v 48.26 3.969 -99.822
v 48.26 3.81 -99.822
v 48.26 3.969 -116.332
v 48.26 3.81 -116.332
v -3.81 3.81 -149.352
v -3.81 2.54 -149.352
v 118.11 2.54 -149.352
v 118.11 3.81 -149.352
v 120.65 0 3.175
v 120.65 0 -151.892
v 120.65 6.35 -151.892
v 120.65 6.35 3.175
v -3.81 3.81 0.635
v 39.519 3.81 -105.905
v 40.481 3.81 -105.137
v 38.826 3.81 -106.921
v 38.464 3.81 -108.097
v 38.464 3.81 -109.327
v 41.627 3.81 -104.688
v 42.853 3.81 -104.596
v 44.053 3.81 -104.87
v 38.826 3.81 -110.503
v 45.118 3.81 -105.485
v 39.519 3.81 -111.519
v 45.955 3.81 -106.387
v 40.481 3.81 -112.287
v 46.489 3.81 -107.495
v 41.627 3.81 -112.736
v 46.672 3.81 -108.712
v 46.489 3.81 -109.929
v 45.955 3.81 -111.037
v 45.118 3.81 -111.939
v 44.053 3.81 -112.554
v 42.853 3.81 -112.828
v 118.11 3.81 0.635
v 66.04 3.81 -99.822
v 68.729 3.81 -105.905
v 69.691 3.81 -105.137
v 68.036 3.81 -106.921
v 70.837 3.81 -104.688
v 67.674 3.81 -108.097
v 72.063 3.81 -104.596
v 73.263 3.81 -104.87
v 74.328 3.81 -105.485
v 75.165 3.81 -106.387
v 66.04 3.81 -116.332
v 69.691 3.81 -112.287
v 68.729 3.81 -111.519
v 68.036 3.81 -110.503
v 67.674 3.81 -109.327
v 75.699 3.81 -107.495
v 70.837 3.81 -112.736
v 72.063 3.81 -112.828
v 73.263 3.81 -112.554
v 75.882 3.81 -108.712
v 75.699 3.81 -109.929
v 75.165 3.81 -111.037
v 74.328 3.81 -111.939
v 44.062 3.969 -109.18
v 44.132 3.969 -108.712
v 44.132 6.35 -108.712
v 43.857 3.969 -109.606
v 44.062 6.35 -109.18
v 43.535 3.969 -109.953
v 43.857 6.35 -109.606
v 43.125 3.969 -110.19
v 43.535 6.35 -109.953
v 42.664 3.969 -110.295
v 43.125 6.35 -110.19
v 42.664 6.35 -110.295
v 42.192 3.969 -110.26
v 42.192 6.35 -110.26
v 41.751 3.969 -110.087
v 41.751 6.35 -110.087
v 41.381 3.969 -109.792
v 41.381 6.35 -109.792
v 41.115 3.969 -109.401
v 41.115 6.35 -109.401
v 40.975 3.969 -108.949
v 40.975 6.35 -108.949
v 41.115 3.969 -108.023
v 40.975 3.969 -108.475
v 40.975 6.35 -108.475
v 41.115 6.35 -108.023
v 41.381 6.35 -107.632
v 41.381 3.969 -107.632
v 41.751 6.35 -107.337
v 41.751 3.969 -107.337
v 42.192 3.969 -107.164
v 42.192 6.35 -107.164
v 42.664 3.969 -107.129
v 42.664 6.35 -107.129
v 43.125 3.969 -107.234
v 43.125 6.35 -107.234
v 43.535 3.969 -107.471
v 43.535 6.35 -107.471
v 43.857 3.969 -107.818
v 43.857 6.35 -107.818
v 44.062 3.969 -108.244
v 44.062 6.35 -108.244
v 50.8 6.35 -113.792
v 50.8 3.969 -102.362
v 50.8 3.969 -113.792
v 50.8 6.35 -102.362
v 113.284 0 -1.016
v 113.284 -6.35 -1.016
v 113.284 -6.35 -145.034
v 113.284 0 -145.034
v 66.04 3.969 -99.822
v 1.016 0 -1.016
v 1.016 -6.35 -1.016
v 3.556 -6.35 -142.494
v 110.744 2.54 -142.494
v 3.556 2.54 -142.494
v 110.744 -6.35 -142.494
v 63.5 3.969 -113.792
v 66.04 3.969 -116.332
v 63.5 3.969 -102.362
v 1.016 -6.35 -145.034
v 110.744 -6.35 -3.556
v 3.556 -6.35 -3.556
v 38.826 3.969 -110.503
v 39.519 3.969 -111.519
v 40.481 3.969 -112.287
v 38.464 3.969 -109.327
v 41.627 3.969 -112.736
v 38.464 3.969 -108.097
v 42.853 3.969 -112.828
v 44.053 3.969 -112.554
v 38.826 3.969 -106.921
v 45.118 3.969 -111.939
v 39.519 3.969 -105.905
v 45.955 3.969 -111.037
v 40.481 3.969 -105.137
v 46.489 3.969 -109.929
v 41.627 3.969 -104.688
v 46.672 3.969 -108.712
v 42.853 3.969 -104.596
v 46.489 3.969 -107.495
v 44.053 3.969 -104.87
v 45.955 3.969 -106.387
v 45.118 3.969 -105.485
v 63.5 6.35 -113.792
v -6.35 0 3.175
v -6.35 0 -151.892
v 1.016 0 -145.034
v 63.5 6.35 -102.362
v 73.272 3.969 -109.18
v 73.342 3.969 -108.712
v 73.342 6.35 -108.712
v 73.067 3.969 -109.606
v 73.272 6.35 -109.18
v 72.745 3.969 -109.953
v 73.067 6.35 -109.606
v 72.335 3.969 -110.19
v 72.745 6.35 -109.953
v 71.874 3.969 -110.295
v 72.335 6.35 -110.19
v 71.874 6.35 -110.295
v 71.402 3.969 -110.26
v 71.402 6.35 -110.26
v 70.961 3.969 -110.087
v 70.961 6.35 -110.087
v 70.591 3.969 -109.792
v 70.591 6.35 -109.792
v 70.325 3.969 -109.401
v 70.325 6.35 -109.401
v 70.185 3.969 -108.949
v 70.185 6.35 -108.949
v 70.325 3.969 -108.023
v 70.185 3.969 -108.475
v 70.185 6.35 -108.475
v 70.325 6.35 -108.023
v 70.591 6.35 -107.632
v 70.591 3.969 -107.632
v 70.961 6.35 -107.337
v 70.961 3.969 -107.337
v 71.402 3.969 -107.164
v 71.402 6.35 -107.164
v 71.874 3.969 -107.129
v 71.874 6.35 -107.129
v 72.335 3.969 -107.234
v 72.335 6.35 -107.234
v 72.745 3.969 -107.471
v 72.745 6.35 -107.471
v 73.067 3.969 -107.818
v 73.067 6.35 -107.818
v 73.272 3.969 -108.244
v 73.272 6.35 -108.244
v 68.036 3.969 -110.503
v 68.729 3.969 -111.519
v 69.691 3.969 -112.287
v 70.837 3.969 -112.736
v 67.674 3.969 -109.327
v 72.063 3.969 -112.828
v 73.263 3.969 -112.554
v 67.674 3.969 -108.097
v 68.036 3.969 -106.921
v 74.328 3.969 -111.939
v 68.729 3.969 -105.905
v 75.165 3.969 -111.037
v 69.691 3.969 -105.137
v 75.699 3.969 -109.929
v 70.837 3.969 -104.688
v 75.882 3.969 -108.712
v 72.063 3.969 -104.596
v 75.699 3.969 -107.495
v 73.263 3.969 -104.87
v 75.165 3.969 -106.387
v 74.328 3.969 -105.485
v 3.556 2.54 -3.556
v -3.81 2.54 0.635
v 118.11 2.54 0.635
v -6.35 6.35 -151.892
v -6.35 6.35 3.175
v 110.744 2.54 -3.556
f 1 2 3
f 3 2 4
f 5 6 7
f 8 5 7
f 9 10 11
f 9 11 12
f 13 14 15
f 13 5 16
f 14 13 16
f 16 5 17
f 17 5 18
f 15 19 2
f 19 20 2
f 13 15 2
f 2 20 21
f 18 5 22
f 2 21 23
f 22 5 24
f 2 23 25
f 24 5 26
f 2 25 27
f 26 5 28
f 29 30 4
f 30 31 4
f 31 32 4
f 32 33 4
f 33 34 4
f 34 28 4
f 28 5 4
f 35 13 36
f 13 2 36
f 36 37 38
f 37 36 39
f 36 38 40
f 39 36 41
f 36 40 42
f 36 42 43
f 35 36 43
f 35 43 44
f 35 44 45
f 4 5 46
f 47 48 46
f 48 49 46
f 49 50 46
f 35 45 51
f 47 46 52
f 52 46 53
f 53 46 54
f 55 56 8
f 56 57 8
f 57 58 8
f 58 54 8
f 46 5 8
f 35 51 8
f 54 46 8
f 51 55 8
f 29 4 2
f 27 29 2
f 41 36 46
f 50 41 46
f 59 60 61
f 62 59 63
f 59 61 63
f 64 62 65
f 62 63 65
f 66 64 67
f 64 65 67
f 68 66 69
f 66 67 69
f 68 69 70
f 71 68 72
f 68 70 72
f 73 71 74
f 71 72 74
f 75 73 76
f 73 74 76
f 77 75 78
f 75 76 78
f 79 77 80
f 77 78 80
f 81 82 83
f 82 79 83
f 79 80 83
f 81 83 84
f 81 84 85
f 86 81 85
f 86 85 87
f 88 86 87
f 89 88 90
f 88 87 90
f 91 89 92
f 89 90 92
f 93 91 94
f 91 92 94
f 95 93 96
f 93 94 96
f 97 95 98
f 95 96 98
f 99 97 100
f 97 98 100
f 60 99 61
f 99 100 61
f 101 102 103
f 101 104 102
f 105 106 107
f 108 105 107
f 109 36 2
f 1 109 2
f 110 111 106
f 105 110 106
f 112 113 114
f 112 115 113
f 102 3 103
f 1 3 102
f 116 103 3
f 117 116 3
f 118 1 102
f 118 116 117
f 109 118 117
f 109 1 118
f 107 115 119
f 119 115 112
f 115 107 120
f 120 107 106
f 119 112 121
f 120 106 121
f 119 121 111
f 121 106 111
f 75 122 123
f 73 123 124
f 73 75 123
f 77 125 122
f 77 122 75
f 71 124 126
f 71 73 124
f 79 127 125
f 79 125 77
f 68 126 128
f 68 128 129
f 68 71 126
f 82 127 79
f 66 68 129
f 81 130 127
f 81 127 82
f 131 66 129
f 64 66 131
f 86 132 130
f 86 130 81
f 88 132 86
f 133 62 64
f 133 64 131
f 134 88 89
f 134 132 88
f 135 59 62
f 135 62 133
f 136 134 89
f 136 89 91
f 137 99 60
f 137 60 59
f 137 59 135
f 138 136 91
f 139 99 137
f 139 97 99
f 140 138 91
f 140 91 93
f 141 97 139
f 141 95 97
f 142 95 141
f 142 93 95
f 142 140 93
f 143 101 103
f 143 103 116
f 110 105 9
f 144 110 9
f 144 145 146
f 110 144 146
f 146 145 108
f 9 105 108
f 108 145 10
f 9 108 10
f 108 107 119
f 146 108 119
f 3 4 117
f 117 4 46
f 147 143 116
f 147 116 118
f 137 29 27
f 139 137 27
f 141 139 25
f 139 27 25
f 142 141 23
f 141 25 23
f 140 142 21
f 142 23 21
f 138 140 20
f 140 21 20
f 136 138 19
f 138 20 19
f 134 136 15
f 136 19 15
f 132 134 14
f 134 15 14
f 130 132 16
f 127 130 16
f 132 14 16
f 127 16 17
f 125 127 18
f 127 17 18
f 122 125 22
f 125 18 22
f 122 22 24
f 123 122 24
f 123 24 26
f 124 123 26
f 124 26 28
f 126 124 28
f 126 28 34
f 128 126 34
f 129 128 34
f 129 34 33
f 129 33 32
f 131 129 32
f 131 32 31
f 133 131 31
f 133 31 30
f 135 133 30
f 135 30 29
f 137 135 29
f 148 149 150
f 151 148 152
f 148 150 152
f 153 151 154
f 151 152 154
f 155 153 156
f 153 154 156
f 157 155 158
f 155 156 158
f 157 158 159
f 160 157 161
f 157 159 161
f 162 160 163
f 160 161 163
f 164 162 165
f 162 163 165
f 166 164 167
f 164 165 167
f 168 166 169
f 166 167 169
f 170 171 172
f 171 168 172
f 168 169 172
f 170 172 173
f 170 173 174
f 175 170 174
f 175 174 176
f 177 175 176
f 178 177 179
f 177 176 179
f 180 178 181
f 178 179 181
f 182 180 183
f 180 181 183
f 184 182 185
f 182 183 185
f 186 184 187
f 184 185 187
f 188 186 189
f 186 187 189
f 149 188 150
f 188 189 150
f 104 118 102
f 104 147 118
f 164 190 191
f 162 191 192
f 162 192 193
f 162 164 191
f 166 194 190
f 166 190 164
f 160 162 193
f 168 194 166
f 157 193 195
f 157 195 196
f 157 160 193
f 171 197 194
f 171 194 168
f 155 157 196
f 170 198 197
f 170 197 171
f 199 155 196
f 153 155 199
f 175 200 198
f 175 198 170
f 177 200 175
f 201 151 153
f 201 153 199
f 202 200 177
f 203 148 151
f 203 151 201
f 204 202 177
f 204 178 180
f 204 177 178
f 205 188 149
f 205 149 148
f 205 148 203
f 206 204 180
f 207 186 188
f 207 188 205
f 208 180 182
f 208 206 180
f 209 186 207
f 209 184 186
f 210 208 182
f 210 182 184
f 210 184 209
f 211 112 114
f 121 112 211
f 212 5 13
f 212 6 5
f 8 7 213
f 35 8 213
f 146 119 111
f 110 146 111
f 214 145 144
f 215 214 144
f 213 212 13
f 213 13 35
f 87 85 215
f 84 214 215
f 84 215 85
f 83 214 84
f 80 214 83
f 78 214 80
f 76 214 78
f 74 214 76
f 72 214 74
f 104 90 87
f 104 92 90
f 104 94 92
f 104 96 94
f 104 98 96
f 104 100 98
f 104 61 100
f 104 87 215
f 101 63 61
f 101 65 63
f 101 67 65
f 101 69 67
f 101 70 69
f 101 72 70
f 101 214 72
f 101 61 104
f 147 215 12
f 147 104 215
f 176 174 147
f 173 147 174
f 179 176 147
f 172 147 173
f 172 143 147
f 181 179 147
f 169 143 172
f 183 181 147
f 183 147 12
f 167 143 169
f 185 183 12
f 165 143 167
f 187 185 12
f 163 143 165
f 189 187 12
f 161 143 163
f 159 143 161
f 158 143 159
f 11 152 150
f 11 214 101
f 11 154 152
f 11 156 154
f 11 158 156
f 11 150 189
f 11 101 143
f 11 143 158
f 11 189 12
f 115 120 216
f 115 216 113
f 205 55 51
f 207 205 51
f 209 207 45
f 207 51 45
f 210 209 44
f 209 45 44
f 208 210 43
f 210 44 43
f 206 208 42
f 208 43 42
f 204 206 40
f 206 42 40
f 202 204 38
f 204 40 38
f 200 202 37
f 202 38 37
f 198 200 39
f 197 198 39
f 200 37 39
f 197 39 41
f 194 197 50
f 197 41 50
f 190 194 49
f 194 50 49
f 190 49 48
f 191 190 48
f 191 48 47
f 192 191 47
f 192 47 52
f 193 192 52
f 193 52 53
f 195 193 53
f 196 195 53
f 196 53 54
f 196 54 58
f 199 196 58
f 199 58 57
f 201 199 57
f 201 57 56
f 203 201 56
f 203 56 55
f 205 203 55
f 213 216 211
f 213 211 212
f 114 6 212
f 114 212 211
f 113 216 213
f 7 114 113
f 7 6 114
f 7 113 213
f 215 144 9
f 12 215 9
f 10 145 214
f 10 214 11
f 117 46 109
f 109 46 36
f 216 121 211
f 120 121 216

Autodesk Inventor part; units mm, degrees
ref_plane "YZ Plane" through (0, 0, 0) normal (1, 0, 0) x (0, 1, 0)
ref_plane "XZ Plane" through (0, 0, 0) normal (0, 1, 0) x (-1, 0, 0)
ref_plane "XY Plane" through (0, 0, 0) normal (0, 0, 1) x (1, 0, 0)
sketch "Sketch1" plane through (0, 0, 0) normal (0, 1, 0) x (-1, 0, 0)
  line L0 (0, 0) -> (-114.3, 0)
  line L1 (-114.3, 0) -> (-114.3, -146.05)
  line L2 (-114.3, -146.05) -> (0, -146.05)
  line L3 (0, -146.05) -> (0, 0)
  dimension "d0" = 114.3
  dimension "d1" = 146.05
extrude "Extrusion1" add sketch "Sketch1" against normal blind 6.35
sketch "Sketch2" plane through (0, 0, 0) normal (0, 1, 0) x (1, 0, 0)
  line L0 (-6.35, 151.892) -> (-6.35, -3.175)
  line L1 (0, 146.05) -> (0, 0) projected
  line L2 (-6.35, 151.892) -> (120.65, 151.892)
  line L3 (114.3, 146.05) -> (0, 146.05) projected
  line L4 (120.65, 151.892) -> (120.65, -3.175)
  line L5 (114.3, 0) -> (114.3, 146.05) projected
  line L6 (-6.35, -3.175) -> (120.65, -3.175)
  line L7 (0, 0) -> (114.3, 0) projected
  dimension "d5" = 6.35
  dimension "d6" = 5.842
  dimension "d7" = 6.35
  dimension "d8" = 3.175
extrude "Extrusion2" add sketch "Sketch2" along normal blind 6.35 contours L2 L4 L6 L0 | L3 L5 L7 L1
sketch "Sketch3" plane through (0, 6.35, 0) normal (0, 1, 0) x (1, 0, 0)
  line L0 (50.8, 113.792) -> (63.5, 113.792)
  line L1 (63.5, 113.792) -> (63.5, 102.362)
  line L2 (63.5, 102.362) -> (50.8, 102.362)
  line L3 (50.8, 102.362) -> (50.8, 113.792)
  circle A0 centre (42.545, 108.712) radius 1.5875
  circle A1 centre (71.755, 108.712) radius 1.5875
  line L4 (120.65, 151.892) -> (-6.35, 151.892) projected
  line L5 (-6.35, 151.892) -> (-6.35, -3.175) projected
  point P0 (0, 0)
  dimension "d11" = 12.7
  dimension "d12" = 11.43
  dimension "d13" = 3.175
  dimension "d14" = 3.175
  dimension "d15" = 8.255
  dimension "d16" = 8.255
  dimension "d19" = 38.1
  dimension "d20" = 57.15
  dimension "d21" = 6.35
  dimension "d22" = 6.35
extrude "Extrusion3" cut sketch "Sketch3" against normal blind 25.4
sketch "Sketch4" plane through (0, -6.35, 0) normal (0, -1, 0) x (1, 0, 0)
  line L0 (0, 0) -> (114.3, 0)
  line L1 (114.3, 0) -> (114.3, -146.05)
  line L2 (114.3, -146.05) -> (0, -146.05)
  line L3 (0, -146.05) -> (0, 0)
  line L4 (1.016, -1.016) -> (113.284, -1.016)
  line L5 (113.284, -1.016) -> (113.284, -145.034)
  line L6 (113.284, -145.034) -> (1.016, -145.034)
  line L7 (1.016, -145.034) -> (1.016, -1.016)
  dimension "d27" = 1.016
extrude "Extrusion4" cut sketch "Sketch4" against normal blind 6.35
shell "Shell1" thickness 2.54 removed faces 1 at (59.2667, -6.35, -34.798)
sketch "Sketch5" plane through (0, -6.35, 0) normal (0, -1, 0) x (1, 0, 0)
  circle A0 centre (71.755, -108.712) radius 1.5875 projected
  circle A1 centre (71.755, -108.712) radius 4.1275
  circle A2 centre (42.545, -108.712) radius 1.5875 projected
  circle A3 centre (42.545, -108.712) radius 4.1275
  line L0 (66.04, -99.822) -> (48.26, -99.822)
  line L1 (48.26, -99.822) -> (48.26, -116.332)
  line L2 (48.26, -116.332) -> (66.04, -116.332)
  line L3 (66.04, -116.332) -> (66.04, -99.822)
  point P0 (0, 0)
extrude "Extrusion5" cut sketch "Sketch5" against normal blind 10.3188
properties part number "button_angle_top"
